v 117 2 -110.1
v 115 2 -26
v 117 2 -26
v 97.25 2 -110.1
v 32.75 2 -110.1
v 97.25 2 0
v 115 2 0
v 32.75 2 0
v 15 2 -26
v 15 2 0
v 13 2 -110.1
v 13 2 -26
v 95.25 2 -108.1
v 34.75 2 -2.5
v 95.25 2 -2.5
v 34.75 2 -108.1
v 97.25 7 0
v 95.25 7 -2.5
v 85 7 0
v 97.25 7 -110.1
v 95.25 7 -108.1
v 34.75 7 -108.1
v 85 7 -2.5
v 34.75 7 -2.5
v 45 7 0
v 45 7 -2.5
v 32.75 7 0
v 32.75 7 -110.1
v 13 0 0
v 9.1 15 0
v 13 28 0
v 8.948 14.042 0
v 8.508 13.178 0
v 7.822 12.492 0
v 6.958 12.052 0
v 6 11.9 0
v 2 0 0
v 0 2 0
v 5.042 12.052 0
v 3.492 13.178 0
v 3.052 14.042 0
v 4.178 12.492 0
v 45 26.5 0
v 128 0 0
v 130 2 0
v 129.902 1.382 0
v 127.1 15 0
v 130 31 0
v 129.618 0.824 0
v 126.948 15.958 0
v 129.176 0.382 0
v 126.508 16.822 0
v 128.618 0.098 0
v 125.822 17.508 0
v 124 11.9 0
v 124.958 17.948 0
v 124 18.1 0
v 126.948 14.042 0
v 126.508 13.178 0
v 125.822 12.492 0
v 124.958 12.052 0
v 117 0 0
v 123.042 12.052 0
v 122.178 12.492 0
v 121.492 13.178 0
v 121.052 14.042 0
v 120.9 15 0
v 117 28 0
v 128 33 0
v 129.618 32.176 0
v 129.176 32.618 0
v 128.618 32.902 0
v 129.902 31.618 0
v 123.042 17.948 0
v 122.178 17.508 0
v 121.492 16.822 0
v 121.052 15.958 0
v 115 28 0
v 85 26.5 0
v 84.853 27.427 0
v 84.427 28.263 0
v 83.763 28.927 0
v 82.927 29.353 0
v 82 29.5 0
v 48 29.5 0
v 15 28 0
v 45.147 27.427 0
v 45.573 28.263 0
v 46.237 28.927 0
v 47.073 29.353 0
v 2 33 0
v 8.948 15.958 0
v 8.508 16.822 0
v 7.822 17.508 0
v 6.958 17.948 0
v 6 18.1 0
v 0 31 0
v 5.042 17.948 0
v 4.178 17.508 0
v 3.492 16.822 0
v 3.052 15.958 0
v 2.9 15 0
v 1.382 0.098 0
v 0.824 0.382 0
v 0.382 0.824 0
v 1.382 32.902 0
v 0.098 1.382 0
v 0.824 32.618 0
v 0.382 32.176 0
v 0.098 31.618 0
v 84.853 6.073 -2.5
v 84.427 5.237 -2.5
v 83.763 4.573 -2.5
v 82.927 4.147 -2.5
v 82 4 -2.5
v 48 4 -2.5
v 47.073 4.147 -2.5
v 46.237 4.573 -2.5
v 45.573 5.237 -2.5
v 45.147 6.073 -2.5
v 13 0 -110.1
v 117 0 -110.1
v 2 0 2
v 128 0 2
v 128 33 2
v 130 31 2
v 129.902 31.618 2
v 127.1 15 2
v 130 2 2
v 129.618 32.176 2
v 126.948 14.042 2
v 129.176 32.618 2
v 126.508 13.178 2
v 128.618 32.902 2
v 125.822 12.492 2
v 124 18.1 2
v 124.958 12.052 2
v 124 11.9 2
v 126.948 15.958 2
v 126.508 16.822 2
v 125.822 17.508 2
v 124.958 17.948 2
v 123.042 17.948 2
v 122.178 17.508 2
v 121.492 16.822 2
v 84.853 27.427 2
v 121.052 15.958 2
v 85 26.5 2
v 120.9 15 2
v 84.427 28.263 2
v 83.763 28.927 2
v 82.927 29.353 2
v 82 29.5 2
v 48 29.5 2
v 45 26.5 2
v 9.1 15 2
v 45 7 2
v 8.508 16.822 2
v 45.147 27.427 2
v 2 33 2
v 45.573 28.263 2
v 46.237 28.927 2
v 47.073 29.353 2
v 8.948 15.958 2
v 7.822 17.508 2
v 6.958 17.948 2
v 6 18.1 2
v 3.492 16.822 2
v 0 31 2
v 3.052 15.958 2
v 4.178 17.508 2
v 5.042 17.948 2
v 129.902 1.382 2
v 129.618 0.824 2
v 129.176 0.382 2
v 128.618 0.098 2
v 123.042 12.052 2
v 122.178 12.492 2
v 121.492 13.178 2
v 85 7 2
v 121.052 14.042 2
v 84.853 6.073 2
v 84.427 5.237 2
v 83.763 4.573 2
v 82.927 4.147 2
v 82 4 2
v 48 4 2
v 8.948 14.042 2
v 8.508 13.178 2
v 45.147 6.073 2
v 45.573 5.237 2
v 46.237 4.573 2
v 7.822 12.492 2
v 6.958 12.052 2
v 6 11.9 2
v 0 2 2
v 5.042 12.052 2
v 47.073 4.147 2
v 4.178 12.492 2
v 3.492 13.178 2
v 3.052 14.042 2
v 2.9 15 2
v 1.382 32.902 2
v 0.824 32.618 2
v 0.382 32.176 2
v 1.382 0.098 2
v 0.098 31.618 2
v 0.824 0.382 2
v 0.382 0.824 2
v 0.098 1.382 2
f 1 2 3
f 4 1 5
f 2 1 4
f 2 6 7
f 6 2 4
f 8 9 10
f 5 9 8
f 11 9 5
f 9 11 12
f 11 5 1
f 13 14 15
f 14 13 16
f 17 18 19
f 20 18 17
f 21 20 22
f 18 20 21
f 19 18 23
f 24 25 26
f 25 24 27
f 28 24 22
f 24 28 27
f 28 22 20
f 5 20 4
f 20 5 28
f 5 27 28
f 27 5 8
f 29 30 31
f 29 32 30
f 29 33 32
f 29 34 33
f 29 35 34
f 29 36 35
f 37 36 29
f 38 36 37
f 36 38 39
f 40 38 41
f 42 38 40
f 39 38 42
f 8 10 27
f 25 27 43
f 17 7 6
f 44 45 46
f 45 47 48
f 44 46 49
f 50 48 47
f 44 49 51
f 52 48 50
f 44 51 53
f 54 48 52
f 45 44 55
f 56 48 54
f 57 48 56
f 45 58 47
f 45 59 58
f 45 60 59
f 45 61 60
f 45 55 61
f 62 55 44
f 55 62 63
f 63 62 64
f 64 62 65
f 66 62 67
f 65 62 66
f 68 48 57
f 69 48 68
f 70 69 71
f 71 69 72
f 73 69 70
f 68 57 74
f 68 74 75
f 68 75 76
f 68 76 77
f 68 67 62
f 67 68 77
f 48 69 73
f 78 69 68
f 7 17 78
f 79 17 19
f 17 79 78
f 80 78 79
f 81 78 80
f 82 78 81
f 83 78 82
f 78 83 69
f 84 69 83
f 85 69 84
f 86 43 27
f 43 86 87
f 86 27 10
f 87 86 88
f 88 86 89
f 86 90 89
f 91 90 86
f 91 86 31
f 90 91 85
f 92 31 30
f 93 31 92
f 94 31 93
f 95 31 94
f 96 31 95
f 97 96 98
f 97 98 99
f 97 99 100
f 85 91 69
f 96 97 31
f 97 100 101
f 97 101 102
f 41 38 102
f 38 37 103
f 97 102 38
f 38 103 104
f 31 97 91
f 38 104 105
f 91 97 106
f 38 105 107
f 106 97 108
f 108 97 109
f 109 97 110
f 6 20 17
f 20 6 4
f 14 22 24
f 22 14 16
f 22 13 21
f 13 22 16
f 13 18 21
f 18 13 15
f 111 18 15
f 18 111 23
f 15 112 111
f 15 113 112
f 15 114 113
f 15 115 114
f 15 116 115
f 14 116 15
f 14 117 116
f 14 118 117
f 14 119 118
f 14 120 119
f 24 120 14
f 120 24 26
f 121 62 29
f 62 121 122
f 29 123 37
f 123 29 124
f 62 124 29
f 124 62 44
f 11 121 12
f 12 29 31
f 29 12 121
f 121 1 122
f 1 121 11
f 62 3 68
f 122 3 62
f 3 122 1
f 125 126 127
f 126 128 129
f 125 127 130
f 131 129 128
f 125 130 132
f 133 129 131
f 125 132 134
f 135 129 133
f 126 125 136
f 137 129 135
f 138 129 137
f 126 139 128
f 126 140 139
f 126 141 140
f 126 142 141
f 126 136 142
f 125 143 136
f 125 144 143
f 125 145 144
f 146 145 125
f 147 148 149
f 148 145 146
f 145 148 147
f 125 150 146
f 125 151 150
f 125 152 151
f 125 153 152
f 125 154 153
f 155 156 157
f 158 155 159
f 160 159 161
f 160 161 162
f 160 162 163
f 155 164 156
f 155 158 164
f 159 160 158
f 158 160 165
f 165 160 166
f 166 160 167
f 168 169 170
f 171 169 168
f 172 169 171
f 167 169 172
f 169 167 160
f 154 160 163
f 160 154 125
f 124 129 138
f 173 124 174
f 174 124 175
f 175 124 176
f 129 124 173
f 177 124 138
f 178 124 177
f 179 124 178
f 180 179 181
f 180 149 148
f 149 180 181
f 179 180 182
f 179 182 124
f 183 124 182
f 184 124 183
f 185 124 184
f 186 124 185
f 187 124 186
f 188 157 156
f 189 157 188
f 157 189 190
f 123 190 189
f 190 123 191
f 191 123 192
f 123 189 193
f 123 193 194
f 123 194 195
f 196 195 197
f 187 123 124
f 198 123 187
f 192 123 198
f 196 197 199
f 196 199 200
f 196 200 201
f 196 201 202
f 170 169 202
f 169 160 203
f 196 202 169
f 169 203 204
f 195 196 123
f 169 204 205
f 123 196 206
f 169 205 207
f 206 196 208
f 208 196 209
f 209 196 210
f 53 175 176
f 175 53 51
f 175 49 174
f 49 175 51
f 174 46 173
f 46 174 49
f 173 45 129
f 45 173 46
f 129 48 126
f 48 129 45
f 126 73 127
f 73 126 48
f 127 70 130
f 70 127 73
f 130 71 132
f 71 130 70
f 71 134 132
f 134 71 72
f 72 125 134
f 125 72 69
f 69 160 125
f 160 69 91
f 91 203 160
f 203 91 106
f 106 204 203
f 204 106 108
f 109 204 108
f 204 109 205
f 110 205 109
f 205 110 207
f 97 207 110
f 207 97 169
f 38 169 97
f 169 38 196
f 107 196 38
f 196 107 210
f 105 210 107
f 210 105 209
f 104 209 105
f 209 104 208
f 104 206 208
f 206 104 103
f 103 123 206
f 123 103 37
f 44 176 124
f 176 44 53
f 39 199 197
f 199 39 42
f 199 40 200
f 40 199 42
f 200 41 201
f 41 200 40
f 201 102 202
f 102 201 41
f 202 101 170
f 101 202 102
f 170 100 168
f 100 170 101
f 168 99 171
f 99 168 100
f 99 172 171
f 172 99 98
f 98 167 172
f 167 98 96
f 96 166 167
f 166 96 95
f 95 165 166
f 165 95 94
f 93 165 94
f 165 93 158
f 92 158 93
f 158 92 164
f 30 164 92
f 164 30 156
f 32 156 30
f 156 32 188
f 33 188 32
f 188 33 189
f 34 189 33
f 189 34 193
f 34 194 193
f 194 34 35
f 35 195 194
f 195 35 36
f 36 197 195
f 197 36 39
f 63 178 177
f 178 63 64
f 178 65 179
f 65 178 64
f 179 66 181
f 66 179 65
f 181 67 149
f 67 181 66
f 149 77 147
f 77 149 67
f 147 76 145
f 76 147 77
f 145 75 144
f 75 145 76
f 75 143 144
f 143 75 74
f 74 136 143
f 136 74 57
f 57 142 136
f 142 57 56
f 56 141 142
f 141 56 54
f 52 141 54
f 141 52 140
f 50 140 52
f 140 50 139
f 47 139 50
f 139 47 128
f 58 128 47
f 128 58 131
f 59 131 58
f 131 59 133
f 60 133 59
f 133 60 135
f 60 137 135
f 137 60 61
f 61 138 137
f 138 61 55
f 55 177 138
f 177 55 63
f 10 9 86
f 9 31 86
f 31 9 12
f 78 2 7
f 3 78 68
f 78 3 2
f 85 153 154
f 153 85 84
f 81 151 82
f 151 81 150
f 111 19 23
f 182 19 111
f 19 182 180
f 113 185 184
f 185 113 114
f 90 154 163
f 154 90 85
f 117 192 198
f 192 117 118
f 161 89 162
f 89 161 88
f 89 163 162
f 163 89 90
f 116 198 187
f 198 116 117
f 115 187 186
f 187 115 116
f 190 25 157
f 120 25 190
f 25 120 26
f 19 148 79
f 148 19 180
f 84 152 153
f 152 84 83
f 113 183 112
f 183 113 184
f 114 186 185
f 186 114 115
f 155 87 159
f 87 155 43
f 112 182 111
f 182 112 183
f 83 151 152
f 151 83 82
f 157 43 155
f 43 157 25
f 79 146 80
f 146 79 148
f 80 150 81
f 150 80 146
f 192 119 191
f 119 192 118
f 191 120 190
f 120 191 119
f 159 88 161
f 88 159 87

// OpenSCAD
$fn = 20;


difference() {
	union() {
		linear_extrude(height = 2) {
			difference() {
				minkowski() {
					square(size = [126, 29]);
					translate(v = [2, 2, 0]) {
						circle(r = 2);
					}
				}
				translate(v = [6.0000000000, 15.0000000000, 0]) {
					union() {
						circle(d = 6.2000000000);
						translate(v = [118, 0, 0]) {
							circle(d = 6.2000000000);
						}
					}
				}
			}
		}
		rotate(a = [270, 0, 0]) {
			translate(v = [13.0000000000, 0, 0]) {
				union() {
					translate(v = [19.7500000000, 0, 2]) {
						linear_extrude(height = 5) {
							difference() {
								square(size = [64.5000000000, 110.1000000000]);
								translate(v = [2, 0, 0]) {
									translate(v = [0, 2.5000000000, 0]) {
										square(size = [60.5000000000, 105.6000000000]);
									}
								}
							}
						}
					}
					linear_extrude(height = 2) {
						square(size = [104, 110.1000000000]);
					}
				}
			}
		}
		translate(v = [15.0000000000, 0, 0]) {
			rotate(a = [270, 0, 90]) {
				linear_extrude(height = 2) {
					polygon(paths = [[0, 1, 2]], points = [[0, 0], [0, 28], [28, 0]]);
				}
			}
		}
		translate(v = [117.0000000000, 0, 0]) {
			rotate(a = [270, 0, 90]) {
				linear_extrude(height = 2) {
					polygon(paths = [[0, 1, 2]], points = [[0, 0], [0, 28], [28, 0]]);
				}
			}
		}
	}
	#translate(v = [0, 0, -2.5000000000]) {
		linear_extrude(height = 4.5000000000) {
			translate(v = [45.0000000000, 4, 0]) {
				minkowski() {
					square(size = [34, 19.5000000000]);
					translate(v = [3, 3, 0]) {
						circle(r = 3);
					}
				}
			}
		}
	}
}
